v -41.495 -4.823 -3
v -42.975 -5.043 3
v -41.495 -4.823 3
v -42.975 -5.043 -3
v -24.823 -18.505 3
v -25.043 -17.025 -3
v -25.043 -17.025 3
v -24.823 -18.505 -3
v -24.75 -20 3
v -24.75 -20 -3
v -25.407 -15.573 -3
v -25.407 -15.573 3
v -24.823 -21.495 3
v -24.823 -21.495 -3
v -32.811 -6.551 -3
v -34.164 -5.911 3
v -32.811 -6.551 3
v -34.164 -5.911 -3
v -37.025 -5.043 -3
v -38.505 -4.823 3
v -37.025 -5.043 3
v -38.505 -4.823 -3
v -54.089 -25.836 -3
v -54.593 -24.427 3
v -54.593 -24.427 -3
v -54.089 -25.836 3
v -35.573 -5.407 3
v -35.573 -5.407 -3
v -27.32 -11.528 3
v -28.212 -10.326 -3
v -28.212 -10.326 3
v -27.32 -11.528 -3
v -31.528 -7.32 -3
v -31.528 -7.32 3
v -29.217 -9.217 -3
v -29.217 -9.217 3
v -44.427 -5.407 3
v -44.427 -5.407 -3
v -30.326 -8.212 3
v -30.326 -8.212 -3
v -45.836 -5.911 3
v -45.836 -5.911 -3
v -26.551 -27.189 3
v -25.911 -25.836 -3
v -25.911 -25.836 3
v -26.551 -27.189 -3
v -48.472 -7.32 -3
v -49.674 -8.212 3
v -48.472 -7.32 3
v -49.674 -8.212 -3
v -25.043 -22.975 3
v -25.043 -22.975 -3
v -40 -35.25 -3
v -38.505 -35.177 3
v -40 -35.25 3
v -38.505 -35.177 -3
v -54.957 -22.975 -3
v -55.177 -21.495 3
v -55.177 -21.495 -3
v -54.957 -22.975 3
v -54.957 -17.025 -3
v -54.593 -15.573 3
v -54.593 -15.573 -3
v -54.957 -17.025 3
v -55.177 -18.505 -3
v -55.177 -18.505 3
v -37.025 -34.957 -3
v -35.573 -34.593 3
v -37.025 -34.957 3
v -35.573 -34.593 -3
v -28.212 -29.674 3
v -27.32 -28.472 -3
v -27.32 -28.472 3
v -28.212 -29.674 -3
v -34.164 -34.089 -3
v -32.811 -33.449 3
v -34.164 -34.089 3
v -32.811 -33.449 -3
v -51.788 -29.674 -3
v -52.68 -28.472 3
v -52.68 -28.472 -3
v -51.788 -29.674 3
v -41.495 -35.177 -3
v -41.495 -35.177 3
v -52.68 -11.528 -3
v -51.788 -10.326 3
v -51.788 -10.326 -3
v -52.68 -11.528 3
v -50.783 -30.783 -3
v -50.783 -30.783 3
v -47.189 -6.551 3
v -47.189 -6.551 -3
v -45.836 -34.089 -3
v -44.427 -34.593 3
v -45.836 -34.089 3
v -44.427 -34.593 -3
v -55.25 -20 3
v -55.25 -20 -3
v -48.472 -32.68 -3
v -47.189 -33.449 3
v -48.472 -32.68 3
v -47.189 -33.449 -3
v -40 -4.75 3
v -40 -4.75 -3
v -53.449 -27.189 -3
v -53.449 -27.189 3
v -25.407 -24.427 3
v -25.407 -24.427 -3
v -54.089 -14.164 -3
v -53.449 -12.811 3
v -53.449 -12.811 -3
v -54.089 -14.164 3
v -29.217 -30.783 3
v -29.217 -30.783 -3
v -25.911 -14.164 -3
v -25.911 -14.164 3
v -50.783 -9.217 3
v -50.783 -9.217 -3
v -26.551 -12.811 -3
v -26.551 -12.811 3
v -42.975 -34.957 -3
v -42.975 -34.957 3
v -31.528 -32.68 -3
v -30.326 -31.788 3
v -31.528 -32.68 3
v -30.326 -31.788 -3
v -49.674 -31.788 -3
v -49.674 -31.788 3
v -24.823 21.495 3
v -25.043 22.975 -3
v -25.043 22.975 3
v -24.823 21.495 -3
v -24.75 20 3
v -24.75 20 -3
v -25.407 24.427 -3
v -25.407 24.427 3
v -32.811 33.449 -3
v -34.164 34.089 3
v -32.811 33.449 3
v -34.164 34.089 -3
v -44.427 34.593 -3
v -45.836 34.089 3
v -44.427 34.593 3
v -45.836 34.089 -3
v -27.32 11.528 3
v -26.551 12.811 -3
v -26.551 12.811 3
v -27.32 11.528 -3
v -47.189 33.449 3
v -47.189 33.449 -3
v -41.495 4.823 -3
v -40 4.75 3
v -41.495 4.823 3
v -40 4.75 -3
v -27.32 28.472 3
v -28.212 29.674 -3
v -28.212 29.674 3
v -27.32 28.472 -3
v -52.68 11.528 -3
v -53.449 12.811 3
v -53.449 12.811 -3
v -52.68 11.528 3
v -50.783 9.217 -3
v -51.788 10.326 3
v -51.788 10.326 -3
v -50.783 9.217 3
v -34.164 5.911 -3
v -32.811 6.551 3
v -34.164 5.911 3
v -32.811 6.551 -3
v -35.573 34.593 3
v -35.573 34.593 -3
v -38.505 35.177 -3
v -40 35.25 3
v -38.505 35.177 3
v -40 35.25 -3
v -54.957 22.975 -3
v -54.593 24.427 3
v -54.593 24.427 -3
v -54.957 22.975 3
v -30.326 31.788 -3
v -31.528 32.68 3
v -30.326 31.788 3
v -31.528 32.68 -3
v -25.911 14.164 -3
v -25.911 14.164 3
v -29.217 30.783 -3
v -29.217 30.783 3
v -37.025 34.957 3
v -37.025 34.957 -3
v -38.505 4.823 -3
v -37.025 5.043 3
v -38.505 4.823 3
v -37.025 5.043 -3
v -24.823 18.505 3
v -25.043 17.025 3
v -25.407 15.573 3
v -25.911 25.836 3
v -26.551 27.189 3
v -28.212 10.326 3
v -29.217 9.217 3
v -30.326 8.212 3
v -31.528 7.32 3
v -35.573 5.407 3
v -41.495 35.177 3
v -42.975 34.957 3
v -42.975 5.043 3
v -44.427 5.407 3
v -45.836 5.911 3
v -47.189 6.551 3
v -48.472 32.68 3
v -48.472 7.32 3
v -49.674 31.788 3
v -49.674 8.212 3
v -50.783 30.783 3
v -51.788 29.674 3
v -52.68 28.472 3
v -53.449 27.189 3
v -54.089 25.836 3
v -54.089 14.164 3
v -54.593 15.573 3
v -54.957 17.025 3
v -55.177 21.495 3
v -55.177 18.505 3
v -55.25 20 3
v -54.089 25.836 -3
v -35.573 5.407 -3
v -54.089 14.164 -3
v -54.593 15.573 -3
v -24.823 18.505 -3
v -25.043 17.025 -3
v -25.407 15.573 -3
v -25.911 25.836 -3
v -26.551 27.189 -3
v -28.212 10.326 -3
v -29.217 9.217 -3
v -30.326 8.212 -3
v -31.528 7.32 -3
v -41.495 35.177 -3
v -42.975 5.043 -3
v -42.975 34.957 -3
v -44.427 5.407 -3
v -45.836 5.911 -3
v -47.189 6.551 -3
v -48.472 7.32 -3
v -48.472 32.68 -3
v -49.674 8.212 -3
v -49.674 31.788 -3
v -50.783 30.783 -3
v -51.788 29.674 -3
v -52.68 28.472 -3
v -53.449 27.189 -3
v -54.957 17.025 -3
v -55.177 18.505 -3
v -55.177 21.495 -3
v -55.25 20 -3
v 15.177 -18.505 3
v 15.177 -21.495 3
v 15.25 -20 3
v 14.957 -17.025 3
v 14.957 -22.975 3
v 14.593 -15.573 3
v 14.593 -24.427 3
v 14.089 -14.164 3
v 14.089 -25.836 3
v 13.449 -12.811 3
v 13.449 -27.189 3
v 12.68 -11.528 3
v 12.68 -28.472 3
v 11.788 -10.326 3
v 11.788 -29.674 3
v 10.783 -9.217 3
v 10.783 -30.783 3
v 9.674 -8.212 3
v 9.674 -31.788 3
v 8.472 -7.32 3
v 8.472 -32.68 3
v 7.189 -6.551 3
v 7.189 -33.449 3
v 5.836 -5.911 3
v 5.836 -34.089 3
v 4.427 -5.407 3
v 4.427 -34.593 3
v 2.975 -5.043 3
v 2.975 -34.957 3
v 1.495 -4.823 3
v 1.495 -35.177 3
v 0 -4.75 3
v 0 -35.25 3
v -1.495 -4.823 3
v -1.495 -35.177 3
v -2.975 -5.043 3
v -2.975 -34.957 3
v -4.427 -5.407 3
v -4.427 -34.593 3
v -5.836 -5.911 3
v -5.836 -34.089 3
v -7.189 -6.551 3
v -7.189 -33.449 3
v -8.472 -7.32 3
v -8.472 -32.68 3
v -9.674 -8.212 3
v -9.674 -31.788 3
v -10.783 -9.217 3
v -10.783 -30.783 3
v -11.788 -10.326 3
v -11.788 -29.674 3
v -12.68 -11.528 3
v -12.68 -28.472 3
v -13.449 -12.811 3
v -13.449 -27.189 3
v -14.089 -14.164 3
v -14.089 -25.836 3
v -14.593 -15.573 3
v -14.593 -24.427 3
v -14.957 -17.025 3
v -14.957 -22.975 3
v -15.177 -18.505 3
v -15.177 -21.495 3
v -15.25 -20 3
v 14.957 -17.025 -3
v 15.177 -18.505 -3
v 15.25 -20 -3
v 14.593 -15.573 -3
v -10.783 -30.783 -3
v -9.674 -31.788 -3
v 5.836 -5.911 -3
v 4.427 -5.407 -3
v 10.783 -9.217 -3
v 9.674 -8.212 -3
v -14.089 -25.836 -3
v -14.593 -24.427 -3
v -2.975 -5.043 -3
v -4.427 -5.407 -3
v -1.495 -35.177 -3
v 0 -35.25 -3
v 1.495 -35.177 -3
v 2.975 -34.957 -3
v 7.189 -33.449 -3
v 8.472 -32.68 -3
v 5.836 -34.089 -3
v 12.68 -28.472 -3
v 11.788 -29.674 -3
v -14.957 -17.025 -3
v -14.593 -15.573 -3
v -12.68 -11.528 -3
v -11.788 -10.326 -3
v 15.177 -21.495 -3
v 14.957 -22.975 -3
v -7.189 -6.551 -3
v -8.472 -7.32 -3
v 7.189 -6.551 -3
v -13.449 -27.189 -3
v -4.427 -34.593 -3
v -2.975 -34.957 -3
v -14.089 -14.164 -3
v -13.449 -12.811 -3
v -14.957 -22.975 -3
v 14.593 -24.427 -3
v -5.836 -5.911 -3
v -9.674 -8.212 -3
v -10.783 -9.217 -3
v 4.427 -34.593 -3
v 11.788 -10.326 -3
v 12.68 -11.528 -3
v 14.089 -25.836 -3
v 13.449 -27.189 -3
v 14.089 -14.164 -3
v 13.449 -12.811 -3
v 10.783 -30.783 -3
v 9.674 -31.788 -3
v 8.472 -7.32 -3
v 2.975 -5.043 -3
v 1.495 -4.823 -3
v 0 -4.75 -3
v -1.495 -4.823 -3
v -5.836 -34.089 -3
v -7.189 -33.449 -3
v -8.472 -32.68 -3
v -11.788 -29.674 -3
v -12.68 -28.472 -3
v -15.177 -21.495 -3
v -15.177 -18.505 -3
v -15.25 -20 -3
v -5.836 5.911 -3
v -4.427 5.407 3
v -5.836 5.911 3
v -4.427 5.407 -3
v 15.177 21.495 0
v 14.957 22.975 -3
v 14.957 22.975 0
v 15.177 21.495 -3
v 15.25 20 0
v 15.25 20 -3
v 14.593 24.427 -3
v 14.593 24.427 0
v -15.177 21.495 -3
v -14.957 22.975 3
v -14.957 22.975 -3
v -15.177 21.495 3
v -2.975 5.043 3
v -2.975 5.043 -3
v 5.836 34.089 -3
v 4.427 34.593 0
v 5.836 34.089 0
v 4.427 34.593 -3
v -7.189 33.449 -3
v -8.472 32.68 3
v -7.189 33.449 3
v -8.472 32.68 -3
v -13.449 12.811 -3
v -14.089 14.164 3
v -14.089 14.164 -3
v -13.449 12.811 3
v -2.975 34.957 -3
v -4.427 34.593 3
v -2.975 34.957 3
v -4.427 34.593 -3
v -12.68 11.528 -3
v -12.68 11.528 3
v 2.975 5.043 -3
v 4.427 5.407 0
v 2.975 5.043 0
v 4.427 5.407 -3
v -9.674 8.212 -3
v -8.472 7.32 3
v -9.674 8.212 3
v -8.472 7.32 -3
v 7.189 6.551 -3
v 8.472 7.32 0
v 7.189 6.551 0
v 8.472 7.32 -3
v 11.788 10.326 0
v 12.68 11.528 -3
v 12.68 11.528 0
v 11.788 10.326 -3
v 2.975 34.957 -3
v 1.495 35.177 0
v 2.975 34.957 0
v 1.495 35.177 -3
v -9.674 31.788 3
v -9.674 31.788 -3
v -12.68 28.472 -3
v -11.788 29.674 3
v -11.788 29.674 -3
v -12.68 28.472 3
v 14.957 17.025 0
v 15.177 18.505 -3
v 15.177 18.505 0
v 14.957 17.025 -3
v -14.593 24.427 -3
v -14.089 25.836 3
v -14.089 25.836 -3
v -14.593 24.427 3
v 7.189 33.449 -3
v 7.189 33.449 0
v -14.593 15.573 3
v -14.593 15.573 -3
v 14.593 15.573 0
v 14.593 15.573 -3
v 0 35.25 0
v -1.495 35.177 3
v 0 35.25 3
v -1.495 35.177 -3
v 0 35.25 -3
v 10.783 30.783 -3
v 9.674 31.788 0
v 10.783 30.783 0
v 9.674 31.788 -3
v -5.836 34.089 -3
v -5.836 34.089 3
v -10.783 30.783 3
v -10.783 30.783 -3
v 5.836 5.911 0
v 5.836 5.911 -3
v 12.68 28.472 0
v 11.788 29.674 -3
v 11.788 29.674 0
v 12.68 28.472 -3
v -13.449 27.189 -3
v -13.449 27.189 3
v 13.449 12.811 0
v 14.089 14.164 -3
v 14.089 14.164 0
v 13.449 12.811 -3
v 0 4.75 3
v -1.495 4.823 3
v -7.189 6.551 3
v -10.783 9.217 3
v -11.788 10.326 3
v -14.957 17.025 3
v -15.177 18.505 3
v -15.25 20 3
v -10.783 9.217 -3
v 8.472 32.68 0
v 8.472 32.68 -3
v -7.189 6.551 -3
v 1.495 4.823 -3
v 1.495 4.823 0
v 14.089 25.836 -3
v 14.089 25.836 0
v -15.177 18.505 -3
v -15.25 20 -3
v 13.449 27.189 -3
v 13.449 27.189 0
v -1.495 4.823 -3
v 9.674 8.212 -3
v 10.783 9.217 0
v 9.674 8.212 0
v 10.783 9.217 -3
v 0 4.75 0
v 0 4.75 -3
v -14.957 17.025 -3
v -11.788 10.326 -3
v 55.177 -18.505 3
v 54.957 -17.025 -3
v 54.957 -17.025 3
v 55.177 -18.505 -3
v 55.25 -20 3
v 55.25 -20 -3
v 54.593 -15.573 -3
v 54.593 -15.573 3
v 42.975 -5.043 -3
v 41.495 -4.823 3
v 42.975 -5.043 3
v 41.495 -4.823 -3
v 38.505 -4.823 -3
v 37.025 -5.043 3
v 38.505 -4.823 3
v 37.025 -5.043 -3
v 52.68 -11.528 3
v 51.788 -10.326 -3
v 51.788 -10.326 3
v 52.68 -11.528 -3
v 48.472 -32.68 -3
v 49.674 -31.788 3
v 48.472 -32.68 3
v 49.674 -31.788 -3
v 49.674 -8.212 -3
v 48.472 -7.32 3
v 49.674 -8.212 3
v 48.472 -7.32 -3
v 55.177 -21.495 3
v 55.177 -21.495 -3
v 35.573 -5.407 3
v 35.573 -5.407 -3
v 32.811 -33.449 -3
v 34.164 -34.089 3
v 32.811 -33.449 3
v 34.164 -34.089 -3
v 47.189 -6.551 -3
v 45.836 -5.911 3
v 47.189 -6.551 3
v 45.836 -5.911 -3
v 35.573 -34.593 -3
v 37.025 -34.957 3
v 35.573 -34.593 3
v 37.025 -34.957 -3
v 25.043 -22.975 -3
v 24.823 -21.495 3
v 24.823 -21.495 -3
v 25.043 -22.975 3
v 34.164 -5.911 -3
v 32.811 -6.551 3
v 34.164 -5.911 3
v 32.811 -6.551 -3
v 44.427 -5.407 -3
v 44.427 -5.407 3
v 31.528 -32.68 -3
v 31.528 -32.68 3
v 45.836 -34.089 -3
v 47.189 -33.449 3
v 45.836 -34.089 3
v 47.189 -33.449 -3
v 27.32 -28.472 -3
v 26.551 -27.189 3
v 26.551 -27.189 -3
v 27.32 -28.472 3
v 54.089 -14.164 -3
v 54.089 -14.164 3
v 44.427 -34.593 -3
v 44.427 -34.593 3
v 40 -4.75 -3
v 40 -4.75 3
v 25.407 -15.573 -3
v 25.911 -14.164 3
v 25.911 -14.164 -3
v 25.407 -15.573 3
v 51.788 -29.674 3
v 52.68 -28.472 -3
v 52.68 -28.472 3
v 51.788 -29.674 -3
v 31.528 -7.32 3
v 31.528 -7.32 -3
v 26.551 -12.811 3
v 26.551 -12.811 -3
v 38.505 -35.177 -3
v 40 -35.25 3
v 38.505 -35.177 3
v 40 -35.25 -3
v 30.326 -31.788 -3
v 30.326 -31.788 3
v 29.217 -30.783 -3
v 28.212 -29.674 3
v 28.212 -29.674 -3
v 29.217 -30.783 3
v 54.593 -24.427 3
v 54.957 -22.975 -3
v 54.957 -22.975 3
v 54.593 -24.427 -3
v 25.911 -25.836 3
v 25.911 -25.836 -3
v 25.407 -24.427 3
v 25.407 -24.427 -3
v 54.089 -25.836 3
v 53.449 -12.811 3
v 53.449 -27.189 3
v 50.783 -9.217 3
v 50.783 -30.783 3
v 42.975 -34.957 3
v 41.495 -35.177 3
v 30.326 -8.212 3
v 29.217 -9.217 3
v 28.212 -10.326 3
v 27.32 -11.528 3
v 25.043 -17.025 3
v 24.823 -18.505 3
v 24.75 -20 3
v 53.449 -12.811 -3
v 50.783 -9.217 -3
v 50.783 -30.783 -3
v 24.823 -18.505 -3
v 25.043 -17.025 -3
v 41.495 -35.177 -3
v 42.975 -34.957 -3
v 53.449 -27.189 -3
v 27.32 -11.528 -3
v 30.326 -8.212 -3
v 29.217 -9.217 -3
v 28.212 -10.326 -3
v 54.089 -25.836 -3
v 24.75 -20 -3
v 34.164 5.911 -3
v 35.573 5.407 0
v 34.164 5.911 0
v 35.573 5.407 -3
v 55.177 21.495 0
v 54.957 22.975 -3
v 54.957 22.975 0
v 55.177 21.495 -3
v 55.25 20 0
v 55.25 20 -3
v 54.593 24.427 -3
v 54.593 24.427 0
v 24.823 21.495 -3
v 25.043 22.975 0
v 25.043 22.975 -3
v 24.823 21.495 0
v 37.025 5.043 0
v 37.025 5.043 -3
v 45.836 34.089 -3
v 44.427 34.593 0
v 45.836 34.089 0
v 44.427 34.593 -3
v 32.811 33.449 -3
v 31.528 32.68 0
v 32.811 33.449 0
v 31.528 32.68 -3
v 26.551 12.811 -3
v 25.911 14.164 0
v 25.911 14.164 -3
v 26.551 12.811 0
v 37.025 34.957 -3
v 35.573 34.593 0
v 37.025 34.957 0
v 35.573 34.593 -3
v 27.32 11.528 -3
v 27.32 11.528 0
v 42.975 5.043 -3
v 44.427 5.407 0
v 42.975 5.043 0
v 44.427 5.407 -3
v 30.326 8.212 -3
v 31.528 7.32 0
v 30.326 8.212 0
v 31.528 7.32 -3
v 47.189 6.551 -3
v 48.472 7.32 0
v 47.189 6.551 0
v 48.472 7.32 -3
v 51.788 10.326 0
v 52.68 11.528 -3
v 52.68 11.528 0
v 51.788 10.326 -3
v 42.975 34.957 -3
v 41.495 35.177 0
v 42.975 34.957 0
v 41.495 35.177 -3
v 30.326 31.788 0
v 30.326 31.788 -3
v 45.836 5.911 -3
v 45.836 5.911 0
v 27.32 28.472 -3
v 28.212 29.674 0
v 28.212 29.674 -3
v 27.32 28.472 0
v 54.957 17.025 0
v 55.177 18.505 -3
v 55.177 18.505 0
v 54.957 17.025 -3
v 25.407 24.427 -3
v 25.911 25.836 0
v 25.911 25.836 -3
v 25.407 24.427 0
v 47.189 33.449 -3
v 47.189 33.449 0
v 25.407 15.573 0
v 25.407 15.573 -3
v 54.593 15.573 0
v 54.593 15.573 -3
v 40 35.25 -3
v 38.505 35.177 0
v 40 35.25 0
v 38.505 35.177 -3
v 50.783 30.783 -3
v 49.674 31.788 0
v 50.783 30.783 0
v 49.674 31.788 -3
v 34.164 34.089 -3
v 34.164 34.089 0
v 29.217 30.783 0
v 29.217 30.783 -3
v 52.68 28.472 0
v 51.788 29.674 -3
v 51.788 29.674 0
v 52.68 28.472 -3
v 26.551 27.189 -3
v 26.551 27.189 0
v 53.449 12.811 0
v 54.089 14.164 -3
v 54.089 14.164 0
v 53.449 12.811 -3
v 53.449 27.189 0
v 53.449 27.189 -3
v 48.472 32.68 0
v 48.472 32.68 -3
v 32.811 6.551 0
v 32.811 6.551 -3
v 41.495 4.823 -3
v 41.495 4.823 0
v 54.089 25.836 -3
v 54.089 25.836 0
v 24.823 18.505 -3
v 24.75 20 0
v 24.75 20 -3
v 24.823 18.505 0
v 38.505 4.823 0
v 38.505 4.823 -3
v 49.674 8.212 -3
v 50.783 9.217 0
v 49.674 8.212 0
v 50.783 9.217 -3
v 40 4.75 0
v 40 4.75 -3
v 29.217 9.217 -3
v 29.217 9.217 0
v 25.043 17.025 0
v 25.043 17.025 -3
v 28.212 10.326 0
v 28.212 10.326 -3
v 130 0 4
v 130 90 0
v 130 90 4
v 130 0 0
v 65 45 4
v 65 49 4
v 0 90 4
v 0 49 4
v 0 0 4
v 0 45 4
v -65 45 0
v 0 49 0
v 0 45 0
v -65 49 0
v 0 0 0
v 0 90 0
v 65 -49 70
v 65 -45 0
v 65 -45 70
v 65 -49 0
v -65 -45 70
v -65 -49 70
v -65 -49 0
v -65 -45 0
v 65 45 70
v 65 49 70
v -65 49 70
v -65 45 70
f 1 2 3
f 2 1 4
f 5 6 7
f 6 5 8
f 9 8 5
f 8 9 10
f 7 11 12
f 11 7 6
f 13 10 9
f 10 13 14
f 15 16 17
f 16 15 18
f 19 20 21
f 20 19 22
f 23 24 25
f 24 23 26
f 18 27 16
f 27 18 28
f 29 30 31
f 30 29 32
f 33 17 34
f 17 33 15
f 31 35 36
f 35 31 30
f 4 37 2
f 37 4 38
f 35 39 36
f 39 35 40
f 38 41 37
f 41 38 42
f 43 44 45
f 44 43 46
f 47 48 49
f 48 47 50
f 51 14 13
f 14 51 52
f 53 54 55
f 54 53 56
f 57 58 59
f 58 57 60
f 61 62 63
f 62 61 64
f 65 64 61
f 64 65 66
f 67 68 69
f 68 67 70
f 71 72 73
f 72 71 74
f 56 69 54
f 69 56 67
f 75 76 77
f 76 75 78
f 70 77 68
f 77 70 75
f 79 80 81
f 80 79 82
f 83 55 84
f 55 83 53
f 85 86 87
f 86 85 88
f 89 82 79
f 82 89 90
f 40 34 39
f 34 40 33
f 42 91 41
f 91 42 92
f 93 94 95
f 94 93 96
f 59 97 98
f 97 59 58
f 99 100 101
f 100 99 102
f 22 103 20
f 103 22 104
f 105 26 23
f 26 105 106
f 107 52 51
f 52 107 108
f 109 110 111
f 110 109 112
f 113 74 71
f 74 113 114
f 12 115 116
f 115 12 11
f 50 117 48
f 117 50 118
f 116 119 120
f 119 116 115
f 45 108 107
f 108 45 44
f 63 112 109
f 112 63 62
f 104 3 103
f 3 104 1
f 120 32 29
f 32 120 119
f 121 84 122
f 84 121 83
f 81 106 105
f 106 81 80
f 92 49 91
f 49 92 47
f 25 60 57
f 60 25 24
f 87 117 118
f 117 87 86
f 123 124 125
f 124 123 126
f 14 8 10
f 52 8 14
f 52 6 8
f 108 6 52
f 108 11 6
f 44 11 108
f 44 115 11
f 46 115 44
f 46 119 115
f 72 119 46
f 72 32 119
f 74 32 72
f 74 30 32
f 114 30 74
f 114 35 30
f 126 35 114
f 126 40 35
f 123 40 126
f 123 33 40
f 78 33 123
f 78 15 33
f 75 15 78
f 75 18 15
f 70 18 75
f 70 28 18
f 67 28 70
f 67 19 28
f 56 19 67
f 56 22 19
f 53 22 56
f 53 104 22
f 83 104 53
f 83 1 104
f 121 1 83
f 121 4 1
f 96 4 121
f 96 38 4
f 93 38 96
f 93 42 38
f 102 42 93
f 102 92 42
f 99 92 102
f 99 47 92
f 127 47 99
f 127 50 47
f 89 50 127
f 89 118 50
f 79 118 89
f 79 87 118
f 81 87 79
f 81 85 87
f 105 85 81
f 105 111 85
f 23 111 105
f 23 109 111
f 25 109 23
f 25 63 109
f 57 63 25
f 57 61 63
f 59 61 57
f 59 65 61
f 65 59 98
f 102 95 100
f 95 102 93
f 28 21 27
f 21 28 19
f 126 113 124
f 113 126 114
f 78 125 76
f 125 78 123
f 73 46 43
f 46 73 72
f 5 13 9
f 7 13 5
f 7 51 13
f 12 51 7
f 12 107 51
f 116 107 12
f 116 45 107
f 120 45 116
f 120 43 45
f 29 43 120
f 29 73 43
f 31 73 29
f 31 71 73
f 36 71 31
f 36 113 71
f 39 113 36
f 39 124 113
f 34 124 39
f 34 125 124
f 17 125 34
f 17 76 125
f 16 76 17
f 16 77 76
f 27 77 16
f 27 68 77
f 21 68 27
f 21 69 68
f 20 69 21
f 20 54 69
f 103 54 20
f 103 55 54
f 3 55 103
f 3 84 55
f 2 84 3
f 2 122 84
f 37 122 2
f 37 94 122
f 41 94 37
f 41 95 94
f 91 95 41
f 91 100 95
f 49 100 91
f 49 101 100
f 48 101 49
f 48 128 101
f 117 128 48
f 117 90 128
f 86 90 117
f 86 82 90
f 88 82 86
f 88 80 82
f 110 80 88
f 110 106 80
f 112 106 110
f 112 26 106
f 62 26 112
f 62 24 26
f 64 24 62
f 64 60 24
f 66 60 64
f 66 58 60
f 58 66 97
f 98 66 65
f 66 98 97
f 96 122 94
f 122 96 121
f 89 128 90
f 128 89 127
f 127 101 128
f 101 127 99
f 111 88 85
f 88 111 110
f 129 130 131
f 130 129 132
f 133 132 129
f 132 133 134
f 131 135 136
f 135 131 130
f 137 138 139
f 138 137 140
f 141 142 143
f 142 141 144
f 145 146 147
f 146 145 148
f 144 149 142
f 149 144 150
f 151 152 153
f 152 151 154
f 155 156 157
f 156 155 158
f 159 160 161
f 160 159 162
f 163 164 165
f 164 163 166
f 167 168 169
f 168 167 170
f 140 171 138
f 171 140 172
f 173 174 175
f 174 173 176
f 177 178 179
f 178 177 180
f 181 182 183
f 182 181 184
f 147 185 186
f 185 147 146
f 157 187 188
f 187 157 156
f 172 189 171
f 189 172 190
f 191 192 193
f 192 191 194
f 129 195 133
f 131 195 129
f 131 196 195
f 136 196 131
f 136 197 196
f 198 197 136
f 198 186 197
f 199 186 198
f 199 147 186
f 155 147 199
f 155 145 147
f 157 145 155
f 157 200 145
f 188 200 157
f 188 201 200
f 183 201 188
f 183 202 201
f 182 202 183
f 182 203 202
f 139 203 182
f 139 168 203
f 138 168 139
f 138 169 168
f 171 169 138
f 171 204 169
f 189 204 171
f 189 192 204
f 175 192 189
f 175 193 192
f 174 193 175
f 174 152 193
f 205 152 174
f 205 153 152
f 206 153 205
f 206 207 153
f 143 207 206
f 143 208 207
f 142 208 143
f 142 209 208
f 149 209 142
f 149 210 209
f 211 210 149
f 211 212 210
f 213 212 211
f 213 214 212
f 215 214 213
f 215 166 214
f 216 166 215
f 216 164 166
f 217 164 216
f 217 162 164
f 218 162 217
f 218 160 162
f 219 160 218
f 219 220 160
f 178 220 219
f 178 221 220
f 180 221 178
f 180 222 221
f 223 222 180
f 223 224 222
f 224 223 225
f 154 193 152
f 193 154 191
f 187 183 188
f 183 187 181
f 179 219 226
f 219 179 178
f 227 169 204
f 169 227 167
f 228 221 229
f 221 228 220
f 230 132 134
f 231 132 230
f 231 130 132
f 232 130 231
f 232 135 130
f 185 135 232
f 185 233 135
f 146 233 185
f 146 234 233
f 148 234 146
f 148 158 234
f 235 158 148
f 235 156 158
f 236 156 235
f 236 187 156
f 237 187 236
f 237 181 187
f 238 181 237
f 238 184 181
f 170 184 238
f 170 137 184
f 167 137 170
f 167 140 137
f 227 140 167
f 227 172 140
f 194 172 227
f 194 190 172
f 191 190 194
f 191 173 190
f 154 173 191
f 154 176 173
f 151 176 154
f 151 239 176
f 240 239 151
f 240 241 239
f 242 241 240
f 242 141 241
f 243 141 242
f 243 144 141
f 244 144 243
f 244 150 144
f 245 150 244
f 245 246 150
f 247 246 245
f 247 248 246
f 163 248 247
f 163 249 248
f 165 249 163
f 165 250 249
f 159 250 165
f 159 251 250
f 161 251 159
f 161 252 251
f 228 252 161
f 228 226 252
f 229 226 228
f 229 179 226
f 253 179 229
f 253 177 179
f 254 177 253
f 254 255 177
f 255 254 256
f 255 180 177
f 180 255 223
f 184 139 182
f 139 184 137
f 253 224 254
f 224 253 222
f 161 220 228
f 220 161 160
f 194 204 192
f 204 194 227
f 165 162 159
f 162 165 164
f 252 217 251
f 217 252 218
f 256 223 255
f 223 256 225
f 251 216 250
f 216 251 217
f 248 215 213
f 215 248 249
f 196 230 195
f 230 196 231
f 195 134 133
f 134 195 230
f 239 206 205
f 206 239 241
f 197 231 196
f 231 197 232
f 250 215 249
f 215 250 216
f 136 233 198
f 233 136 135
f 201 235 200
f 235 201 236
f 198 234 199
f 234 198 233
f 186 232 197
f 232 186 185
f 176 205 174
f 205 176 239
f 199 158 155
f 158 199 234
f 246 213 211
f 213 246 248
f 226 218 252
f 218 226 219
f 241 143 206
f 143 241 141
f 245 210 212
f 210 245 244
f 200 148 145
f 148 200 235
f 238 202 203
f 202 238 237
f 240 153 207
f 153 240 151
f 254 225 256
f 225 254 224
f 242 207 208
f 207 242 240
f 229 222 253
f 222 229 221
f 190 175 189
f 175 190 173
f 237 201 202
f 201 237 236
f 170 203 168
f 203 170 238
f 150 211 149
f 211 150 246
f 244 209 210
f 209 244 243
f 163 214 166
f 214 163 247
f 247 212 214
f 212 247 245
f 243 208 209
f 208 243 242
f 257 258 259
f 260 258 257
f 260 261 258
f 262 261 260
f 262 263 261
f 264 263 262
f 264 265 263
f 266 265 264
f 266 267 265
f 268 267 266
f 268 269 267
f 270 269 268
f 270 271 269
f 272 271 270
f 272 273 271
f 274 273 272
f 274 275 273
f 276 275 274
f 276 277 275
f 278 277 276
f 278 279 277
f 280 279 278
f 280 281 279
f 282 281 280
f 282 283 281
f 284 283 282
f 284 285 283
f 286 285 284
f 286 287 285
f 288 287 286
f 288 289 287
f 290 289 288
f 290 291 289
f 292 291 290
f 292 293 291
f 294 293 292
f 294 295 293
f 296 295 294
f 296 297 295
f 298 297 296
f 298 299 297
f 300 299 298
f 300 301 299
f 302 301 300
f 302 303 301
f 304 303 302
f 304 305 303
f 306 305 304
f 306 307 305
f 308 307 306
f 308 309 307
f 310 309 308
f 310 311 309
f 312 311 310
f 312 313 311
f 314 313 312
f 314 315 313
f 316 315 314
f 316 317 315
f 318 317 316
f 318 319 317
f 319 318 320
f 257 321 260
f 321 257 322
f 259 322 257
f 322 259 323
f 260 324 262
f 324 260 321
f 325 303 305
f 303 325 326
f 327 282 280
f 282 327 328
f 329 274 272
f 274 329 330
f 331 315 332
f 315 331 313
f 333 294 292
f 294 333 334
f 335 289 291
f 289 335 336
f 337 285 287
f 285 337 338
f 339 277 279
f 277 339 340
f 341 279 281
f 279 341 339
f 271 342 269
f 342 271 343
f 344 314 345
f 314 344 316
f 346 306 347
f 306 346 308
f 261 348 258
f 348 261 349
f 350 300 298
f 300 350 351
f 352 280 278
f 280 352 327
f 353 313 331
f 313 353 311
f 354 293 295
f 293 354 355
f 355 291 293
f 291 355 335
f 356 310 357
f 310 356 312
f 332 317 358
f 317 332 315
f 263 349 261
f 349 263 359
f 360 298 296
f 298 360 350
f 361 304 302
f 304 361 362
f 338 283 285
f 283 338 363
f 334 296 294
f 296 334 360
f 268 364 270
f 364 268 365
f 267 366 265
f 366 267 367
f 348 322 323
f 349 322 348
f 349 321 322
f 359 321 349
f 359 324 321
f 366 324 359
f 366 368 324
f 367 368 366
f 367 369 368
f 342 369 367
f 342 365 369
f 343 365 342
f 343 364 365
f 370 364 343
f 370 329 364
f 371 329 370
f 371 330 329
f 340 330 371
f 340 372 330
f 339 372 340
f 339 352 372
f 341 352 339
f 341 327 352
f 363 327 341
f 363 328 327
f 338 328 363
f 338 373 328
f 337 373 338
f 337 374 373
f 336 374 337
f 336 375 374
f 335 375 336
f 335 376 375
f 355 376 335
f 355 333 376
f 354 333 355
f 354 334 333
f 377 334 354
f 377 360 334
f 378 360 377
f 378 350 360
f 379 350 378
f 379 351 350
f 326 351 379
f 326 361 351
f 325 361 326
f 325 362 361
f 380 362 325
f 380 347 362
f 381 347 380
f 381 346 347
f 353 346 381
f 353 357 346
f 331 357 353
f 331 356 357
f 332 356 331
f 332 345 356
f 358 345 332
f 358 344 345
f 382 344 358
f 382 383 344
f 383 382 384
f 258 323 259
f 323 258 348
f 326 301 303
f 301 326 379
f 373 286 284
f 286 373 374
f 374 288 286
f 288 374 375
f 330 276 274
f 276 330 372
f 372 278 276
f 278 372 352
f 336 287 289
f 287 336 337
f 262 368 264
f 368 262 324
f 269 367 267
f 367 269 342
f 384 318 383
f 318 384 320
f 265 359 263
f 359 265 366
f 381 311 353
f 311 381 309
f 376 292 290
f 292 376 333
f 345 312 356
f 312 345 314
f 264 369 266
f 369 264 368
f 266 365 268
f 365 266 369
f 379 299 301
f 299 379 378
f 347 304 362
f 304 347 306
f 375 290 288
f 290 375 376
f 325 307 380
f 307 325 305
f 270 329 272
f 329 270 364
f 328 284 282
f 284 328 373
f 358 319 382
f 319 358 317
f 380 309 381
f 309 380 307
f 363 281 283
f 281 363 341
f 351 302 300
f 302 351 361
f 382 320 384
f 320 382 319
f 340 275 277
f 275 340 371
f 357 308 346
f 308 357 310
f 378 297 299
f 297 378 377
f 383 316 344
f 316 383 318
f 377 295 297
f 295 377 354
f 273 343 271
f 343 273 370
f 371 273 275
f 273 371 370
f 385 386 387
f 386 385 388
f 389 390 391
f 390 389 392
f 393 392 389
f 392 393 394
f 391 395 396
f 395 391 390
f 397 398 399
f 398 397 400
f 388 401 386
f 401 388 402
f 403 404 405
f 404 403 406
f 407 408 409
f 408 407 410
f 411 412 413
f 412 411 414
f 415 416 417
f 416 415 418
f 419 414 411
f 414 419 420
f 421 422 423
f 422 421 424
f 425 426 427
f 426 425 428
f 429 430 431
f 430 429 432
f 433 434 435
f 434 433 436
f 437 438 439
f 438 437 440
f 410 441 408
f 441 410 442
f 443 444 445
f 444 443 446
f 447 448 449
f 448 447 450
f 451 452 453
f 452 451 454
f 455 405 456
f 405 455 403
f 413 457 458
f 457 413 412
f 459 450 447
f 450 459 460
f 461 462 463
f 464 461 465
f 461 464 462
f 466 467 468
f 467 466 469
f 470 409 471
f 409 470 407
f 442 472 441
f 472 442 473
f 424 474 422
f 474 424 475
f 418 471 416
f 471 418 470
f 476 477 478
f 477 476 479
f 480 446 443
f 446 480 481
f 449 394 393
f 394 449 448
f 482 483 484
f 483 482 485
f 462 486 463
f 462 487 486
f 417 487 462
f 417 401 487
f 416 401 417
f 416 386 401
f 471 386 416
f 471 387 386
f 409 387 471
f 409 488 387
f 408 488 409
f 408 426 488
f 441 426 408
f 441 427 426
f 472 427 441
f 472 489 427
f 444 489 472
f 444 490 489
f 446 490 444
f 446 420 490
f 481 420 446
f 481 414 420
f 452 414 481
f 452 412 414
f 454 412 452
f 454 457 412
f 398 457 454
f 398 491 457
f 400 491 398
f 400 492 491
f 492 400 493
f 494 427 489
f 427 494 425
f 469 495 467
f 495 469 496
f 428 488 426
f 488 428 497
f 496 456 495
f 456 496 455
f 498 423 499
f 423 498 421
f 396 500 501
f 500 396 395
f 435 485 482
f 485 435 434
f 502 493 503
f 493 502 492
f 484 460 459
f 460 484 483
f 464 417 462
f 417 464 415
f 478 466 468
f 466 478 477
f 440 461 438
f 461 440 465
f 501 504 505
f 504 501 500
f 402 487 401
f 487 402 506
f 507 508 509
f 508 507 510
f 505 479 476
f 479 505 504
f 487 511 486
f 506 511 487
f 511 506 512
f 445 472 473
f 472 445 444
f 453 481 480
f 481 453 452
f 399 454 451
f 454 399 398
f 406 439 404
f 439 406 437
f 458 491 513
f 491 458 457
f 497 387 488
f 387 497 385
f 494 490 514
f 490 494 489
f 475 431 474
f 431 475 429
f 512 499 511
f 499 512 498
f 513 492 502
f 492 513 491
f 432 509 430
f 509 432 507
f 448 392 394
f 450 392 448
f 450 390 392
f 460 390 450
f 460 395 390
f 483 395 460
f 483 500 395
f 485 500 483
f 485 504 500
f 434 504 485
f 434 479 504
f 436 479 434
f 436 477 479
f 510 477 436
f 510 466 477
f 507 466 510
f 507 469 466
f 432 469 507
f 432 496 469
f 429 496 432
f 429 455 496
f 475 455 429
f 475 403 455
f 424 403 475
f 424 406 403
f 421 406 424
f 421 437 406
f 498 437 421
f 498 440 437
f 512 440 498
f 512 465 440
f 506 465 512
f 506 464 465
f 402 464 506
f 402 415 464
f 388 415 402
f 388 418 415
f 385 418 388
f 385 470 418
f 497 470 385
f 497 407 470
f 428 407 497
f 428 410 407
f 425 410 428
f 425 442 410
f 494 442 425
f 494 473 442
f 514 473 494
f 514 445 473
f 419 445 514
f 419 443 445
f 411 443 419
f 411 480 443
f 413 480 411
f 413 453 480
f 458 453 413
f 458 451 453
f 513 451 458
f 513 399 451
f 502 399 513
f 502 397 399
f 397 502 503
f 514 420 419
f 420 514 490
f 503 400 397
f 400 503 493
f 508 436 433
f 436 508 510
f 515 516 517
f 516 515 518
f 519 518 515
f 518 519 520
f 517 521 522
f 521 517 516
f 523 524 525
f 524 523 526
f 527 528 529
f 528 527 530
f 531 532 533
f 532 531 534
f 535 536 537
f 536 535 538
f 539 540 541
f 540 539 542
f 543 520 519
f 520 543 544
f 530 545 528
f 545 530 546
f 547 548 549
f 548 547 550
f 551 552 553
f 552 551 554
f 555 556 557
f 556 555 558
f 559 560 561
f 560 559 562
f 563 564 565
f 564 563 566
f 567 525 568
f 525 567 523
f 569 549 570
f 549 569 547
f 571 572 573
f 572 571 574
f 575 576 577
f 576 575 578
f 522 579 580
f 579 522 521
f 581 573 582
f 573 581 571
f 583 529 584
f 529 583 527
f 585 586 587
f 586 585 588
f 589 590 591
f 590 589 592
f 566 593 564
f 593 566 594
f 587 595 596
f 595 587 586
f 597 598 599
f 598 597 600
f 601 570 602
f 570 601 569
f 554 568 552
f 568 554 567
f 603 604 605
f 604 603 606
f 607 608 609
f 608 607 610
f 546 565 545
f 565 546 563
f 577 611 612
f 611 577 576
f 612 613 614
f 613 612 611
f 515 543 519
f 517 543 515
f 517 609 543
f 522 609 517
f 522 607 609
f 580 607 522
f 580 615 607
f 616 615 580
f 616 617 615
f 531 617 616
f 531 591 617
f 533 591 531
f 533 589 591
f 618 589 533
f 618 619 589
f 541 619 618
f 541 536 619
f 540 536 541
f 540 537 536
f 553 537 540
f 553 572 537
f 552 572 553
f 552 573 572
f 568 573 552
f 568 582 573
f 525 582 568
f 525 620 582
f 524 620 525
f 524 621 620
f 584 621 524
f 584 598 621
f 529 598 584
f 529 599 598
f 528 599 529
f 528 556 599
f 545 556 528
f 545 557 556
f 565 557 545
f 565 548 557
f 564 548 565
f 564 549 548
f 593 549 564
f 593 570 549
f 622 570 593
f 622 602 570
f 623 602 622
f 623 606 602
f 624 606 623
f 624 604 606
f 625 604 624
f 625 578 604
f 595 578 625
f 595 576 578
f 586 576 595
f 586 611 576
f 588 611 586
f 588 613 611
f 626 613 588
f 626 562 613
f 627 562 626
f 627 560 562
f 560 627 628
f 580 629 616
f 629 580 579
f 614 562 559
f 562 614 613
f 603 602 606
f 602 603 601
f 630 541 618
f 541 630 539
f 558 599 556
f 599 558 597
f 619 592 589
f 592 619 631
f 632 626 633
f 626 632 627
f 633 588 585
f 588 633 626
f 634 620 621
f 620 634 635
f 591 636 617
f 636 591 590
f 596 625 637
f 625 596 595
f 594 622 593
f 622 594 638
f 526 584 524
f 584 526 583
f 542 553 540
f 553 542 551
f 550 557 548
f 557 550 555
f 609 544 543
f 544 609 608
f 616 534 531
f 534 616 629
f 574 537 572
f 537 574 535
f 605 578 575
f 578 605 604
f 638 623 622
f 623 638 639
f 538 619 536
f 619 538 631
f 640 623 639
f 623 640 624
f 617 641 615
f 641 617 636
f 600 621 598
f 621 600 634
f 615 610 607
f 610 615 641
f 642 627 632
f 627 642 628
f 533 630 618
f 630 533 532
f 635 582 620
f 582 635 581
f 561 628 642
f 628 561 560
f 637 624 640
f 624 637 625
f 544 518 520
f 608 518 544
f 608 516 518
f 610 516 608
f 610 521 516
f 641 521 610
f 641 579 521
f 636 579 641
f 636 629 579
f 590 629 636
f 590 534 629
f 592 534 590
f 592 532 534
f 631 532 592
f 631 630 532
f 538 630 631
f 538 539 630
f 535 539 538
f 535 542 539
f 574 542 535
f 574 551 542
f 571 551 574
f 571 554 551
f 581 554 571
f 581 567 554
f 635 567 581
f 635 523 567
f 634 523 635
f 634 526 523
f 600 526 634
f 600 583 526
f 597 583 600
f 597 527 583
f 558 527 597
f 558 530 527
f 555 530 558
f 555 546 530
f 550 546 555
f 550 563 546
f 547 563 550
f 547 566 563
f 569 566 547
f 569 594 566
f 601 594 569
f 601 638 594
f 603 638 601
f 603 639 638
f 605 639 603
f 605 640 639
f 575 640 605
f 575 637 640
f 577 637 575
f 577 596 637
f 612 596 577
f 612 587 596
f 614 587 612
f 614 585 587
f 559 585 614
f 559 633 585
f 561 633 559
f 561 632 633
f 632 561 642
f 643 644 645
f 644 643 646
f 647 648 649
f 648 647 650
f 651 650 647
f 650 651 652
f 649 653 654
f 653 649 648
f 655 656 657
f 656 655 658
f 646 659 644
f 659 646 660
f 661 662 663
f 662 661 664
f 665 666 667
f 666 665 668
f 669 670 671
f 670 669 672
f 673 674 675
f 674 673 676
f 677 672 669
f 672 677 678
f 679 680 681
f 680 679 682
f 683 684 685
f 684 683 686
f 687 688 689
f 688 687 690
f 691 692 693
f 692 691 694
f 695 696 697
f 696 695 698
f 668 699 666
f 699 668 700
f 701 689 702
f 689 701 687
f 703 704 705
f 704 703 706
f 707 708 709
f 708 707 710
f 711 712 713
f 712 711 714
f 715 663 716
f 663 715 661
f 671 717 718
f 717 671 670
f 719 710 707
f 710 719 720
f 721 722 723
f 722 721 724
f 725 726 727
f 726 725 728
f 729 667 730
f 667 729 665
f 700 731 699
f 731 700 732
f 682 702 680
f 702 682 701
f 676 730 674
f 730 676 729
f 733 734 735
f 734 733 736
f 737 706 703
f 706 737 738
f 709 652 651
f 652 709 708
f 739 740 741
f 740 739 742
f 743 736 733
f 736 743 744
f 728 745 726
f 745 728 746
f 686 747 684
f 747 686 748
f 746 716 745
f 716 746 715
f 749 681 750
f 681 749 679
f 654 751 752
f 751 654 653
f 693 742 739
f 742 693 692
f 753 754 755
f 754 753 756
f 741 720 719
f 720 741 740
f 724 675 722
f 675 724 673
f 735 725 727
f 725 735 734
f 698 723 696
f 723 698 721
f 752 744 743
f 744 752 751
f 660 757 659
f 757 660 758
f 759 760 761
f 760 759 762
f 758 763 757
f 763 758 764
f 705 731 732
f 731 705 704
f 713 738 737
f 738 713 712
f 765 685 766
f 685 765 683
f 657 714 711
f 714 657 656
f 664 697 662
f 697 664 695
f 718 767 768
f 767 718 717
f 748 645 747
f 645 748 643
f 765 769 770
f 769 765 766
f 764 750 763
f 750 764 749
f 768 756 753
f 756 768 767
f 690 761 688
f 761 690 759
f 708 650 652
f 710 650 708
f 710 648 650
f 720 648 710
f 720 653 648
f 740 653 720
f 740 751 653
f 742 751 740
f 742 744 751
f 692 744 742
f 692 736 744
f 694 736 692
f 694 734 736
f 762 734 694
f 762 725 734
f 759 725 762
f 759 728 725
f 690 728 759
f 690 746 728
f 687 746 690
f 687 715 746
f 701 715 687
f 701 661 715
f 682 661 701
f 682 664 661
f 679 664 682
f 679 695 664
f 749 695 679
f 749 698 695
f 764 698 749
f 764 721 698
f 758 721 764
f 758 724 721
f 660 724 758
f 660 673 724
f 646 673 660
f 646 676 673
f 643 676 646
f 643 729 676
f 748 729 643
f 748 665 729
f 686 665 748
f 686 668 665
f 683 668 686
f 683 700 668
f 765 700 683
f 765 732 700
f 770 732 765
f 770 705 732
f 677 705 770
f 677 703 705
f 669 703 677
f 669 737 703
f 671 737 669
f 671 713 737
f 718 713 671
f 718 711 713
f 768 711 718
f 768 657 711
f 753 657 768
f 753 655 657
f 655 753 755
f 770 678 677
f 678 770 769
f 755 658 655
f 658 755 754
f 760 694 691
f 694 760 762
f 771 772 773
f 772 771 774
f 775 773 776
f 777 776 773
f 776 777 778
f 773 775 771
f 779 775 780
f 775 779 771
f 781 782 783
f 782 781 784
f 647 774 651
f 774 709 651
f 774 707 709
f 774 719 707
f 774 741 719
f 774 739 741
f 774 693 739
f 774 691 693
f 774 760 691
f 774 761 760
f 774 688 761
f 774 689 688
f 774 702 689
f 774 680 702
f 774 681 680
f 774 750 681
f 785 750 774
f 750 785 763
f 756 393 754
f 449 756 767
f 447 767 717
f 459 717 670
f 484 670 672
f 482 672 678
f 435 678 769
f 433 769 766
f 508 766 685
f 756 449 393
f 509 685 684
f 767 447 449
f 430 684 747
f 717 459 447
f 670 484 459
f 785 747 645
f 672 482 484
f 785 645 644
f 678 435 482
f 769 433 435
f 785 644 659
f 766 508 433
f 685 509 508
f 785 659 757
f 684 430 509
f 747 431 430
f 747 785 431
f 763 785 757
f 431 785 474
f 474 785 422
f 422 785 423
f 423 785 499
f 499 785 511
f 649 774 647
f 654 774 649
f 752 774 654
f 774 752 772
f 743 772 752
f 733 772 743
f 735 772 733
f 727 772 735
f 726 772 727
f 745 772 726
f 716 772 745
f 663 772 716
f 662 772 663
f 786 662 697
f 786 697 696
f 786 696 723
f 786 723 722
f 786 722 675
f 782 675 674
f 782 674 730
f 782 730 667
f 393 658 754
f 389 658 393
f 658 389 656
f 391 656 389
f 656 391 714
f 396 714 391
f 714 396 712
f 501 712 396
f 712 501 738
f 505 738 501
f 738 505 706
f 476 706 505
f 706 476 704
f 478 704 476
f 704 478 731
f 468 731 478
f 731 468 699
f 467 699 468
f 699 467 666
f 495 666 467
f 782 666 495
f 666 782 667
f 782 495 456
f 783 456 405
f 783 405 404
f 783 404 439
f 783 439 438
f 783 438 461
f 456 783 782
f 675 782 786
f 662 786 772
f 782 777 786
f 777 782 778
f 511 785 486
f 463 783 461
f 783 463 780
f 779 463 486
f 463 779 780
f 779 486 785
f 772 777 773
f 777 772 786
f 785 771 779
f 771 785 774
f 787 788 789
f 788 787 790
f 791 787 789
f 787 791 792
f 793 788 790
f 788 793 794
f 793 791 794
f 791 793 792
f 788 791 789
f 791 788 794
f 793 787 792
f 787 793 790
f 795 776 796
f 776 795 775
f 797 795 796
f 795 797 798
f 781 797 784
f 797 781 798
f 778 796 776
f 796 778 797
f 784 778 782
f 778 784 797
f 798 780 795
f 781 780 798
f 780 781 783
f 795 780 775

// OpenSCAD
$fn = 64;

// --- Dimensions ---
// Base plate dimensions
PLATE_LENGTH_X = 130;
PLATE_WIDTH_Y = 90;
PLATE_THICKNESS_Z = 4;

// Hole dimensions
HOLE_DIAMETER = 30.5;
HOLE_RADIUS = HOLE_DIAMETER / 2;

// Hole grid spacing
HOLE_SPACING_X = 40;
HOLE_SPACING_Y = 40;

// Wall dimensions
WALL_LENGTH_X = 130;
WALL_THICKNESS_Y = 4;
WALL_HEIGHT_Z = 70;

// --- Geometry Construction ---

module rack() {
    // 1. Create the base plate
    // Centered at origin, lying on XY plane (z=0 to z=4)
    translate([0, 0, 0])
        cube([PLATE_LENGTH_X, PLATE_WIDTH_Y, PLATE_THICKNESS_Z]);

    // 2. Create the holes
    // We use a for loop to create the 6 holes (2 rows, 3 columns)
    // Holes are centered on the plate.
    // X positions: -40, 0, 40 (Spacing 40)
    // Y positions: -20, 20 (Spacing 40)
    // We use difference to cut the holes through the plate.
    // The cutters must extend past the plate faces (z=0 and z=4) by at least 0.01mm.
    // We use a height of 10mm for the cutters to ensure they fully penetrate.
    for (x_pos = [-40, 0, 40]) {
        for (y_pos = [-20, 20]) {
            // Create a cylinder cutter
            // Centered at (x_pos, y_pos, 2) (midpoint of plate thickness)
            // Height 10mm ensures it extends past z=0 and z=4
            translate([x_pos, y_pos, 0])
                cylinder(h = PLATE_THICKNESS_Z + 2, r = HOLE_RADIUS, center = true);
        }
    }

    // 3. Create the two solid walls
    // Walls run along the long edges (X-axis) of the plate.
    // They are flush with the plate's long edge.
    // Plate Y range: -45 to 45.
    // Wall thickness: 4mm.
    // To be "flush" with the edge and act as feet (standing on walls),
    // the walls are placed outside the plate footprint.
    // Wall 1 (Left): Y from -49 to -45.
    // Wall 2 (Right): Y from 45 to 49.
    // Both walls are 130mm long (X) and 70mm high (Z).
    
    // Wall 1
    translate([-PLATE_LENGTH_X / 2, -PLATE_WIDTH_Y / 2 - WALL_THICKNESS_Y, 0])
        cube([WALL_LENGTH_X, WALL_THICKNESS_Y, WALL_HEIGHT_Z]);

    // Wall 2
    translate([-PLATE_LENGTH_X / 2, PLATE_WIDTH_Y / 2, 0])
        cube([WALL_LENGTH_X, WALL_THICKNESS_Y, WALL_HEIGHT_Z]);
}

// Execute the module
rack();
